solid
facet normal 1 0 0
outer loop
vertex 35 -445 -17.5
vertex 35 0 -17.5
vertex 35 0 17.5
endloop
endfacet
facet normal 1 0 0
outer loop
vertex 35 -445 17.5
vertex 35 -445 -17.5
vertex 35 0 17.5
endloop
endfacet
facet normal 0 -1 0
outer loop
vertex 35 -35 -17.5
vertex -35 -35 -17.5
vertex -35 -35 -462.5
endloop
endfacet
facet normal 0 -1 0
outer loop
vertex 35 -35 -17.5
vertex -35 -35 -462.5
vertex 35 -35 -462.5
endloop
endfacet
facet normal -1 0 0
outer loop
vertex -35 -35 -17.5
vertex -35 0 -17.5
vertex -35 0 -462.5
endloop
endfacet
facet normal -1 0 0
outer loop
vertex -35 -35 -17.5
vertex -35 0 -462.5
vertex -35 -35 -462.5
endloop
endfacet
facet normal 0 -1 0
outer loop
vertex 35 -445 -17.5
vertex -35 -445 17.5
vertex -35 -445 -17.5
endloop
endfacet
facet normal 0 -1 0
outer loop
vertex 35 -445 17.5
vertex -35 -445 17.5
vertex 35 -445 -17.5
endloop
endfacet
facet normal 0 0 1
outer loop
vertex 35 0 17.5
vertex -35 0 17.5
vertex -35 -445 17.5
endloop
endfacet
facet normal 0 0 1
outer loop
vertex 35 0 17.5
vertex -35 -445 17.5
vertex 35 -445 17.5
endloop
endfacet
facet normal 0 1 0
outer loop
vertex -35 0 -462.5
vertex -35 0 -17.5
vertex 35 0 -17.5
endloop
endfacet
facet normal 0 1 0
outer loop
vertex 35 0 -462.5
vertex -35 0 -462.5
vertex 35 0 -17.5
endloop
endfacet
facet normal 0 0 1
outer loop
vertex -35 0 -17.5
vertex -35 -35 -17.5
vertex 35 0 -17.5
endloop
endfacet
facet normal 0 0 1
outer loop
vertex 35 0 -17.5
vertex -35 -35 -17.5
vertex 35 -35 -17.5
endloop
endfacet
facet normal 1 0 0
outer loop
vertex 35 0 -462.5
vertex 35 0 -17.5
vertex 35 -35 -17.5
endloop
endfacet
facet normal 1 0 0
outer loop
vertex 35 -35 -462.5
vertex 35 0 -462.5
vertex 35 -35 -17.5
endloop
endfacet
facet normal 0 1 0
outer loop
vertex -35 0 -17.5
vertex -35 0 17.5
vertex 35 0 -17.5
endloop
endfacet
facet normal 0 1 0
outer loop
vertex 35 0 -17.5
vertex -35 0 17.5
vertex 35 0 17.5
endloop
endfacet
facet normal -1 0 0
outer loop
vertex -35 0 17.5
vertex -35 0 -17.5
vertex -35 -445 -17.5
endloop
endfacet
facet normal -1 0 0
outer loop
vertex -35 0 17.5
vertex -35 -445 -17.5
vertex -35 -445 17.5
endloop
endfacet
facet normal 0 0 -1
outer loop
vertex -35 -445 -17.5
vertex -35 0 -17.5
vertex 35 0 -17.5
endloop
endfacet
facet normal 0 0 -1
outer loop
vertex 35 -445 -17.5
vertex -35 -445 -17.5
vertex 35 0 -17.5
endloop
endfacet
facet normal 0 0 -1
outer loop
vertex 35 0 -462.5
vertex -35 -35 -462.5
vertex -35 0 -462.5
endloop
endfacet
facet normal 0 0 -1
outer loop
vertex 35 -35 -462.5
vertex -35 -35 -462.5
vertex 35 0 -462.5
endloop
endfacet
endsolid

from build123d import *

# Parameters (mm, degrees)
F0_W     = 70
F0_H     = 35
F1_DEPTH = 445
F2_W     = 70
F2_H     = 35
F3_DEPTH = 445


with BuildPart() as f1:
    # F0 (on Front) → F1 (new body)
    with BuildSketch(Plane.XZ):
        Rectangle(F0_W, F0_H)
    extrude(amount=F1_DEPTH)


with BuildPart() as f3:
    # F2 (on face) → F3 (new body)
    with BuildSketch(Plane(origin=(0, 0, -17.5), x_dir=(1, 0, 0), z_dir=(0, 0, -1))):
        with Locations((0, 17.5)):
            Rectangle(F2_W, F2_H)
    extrude(amount=F3_DEPTH)


solid = Compound([f1.part, f3.part])
